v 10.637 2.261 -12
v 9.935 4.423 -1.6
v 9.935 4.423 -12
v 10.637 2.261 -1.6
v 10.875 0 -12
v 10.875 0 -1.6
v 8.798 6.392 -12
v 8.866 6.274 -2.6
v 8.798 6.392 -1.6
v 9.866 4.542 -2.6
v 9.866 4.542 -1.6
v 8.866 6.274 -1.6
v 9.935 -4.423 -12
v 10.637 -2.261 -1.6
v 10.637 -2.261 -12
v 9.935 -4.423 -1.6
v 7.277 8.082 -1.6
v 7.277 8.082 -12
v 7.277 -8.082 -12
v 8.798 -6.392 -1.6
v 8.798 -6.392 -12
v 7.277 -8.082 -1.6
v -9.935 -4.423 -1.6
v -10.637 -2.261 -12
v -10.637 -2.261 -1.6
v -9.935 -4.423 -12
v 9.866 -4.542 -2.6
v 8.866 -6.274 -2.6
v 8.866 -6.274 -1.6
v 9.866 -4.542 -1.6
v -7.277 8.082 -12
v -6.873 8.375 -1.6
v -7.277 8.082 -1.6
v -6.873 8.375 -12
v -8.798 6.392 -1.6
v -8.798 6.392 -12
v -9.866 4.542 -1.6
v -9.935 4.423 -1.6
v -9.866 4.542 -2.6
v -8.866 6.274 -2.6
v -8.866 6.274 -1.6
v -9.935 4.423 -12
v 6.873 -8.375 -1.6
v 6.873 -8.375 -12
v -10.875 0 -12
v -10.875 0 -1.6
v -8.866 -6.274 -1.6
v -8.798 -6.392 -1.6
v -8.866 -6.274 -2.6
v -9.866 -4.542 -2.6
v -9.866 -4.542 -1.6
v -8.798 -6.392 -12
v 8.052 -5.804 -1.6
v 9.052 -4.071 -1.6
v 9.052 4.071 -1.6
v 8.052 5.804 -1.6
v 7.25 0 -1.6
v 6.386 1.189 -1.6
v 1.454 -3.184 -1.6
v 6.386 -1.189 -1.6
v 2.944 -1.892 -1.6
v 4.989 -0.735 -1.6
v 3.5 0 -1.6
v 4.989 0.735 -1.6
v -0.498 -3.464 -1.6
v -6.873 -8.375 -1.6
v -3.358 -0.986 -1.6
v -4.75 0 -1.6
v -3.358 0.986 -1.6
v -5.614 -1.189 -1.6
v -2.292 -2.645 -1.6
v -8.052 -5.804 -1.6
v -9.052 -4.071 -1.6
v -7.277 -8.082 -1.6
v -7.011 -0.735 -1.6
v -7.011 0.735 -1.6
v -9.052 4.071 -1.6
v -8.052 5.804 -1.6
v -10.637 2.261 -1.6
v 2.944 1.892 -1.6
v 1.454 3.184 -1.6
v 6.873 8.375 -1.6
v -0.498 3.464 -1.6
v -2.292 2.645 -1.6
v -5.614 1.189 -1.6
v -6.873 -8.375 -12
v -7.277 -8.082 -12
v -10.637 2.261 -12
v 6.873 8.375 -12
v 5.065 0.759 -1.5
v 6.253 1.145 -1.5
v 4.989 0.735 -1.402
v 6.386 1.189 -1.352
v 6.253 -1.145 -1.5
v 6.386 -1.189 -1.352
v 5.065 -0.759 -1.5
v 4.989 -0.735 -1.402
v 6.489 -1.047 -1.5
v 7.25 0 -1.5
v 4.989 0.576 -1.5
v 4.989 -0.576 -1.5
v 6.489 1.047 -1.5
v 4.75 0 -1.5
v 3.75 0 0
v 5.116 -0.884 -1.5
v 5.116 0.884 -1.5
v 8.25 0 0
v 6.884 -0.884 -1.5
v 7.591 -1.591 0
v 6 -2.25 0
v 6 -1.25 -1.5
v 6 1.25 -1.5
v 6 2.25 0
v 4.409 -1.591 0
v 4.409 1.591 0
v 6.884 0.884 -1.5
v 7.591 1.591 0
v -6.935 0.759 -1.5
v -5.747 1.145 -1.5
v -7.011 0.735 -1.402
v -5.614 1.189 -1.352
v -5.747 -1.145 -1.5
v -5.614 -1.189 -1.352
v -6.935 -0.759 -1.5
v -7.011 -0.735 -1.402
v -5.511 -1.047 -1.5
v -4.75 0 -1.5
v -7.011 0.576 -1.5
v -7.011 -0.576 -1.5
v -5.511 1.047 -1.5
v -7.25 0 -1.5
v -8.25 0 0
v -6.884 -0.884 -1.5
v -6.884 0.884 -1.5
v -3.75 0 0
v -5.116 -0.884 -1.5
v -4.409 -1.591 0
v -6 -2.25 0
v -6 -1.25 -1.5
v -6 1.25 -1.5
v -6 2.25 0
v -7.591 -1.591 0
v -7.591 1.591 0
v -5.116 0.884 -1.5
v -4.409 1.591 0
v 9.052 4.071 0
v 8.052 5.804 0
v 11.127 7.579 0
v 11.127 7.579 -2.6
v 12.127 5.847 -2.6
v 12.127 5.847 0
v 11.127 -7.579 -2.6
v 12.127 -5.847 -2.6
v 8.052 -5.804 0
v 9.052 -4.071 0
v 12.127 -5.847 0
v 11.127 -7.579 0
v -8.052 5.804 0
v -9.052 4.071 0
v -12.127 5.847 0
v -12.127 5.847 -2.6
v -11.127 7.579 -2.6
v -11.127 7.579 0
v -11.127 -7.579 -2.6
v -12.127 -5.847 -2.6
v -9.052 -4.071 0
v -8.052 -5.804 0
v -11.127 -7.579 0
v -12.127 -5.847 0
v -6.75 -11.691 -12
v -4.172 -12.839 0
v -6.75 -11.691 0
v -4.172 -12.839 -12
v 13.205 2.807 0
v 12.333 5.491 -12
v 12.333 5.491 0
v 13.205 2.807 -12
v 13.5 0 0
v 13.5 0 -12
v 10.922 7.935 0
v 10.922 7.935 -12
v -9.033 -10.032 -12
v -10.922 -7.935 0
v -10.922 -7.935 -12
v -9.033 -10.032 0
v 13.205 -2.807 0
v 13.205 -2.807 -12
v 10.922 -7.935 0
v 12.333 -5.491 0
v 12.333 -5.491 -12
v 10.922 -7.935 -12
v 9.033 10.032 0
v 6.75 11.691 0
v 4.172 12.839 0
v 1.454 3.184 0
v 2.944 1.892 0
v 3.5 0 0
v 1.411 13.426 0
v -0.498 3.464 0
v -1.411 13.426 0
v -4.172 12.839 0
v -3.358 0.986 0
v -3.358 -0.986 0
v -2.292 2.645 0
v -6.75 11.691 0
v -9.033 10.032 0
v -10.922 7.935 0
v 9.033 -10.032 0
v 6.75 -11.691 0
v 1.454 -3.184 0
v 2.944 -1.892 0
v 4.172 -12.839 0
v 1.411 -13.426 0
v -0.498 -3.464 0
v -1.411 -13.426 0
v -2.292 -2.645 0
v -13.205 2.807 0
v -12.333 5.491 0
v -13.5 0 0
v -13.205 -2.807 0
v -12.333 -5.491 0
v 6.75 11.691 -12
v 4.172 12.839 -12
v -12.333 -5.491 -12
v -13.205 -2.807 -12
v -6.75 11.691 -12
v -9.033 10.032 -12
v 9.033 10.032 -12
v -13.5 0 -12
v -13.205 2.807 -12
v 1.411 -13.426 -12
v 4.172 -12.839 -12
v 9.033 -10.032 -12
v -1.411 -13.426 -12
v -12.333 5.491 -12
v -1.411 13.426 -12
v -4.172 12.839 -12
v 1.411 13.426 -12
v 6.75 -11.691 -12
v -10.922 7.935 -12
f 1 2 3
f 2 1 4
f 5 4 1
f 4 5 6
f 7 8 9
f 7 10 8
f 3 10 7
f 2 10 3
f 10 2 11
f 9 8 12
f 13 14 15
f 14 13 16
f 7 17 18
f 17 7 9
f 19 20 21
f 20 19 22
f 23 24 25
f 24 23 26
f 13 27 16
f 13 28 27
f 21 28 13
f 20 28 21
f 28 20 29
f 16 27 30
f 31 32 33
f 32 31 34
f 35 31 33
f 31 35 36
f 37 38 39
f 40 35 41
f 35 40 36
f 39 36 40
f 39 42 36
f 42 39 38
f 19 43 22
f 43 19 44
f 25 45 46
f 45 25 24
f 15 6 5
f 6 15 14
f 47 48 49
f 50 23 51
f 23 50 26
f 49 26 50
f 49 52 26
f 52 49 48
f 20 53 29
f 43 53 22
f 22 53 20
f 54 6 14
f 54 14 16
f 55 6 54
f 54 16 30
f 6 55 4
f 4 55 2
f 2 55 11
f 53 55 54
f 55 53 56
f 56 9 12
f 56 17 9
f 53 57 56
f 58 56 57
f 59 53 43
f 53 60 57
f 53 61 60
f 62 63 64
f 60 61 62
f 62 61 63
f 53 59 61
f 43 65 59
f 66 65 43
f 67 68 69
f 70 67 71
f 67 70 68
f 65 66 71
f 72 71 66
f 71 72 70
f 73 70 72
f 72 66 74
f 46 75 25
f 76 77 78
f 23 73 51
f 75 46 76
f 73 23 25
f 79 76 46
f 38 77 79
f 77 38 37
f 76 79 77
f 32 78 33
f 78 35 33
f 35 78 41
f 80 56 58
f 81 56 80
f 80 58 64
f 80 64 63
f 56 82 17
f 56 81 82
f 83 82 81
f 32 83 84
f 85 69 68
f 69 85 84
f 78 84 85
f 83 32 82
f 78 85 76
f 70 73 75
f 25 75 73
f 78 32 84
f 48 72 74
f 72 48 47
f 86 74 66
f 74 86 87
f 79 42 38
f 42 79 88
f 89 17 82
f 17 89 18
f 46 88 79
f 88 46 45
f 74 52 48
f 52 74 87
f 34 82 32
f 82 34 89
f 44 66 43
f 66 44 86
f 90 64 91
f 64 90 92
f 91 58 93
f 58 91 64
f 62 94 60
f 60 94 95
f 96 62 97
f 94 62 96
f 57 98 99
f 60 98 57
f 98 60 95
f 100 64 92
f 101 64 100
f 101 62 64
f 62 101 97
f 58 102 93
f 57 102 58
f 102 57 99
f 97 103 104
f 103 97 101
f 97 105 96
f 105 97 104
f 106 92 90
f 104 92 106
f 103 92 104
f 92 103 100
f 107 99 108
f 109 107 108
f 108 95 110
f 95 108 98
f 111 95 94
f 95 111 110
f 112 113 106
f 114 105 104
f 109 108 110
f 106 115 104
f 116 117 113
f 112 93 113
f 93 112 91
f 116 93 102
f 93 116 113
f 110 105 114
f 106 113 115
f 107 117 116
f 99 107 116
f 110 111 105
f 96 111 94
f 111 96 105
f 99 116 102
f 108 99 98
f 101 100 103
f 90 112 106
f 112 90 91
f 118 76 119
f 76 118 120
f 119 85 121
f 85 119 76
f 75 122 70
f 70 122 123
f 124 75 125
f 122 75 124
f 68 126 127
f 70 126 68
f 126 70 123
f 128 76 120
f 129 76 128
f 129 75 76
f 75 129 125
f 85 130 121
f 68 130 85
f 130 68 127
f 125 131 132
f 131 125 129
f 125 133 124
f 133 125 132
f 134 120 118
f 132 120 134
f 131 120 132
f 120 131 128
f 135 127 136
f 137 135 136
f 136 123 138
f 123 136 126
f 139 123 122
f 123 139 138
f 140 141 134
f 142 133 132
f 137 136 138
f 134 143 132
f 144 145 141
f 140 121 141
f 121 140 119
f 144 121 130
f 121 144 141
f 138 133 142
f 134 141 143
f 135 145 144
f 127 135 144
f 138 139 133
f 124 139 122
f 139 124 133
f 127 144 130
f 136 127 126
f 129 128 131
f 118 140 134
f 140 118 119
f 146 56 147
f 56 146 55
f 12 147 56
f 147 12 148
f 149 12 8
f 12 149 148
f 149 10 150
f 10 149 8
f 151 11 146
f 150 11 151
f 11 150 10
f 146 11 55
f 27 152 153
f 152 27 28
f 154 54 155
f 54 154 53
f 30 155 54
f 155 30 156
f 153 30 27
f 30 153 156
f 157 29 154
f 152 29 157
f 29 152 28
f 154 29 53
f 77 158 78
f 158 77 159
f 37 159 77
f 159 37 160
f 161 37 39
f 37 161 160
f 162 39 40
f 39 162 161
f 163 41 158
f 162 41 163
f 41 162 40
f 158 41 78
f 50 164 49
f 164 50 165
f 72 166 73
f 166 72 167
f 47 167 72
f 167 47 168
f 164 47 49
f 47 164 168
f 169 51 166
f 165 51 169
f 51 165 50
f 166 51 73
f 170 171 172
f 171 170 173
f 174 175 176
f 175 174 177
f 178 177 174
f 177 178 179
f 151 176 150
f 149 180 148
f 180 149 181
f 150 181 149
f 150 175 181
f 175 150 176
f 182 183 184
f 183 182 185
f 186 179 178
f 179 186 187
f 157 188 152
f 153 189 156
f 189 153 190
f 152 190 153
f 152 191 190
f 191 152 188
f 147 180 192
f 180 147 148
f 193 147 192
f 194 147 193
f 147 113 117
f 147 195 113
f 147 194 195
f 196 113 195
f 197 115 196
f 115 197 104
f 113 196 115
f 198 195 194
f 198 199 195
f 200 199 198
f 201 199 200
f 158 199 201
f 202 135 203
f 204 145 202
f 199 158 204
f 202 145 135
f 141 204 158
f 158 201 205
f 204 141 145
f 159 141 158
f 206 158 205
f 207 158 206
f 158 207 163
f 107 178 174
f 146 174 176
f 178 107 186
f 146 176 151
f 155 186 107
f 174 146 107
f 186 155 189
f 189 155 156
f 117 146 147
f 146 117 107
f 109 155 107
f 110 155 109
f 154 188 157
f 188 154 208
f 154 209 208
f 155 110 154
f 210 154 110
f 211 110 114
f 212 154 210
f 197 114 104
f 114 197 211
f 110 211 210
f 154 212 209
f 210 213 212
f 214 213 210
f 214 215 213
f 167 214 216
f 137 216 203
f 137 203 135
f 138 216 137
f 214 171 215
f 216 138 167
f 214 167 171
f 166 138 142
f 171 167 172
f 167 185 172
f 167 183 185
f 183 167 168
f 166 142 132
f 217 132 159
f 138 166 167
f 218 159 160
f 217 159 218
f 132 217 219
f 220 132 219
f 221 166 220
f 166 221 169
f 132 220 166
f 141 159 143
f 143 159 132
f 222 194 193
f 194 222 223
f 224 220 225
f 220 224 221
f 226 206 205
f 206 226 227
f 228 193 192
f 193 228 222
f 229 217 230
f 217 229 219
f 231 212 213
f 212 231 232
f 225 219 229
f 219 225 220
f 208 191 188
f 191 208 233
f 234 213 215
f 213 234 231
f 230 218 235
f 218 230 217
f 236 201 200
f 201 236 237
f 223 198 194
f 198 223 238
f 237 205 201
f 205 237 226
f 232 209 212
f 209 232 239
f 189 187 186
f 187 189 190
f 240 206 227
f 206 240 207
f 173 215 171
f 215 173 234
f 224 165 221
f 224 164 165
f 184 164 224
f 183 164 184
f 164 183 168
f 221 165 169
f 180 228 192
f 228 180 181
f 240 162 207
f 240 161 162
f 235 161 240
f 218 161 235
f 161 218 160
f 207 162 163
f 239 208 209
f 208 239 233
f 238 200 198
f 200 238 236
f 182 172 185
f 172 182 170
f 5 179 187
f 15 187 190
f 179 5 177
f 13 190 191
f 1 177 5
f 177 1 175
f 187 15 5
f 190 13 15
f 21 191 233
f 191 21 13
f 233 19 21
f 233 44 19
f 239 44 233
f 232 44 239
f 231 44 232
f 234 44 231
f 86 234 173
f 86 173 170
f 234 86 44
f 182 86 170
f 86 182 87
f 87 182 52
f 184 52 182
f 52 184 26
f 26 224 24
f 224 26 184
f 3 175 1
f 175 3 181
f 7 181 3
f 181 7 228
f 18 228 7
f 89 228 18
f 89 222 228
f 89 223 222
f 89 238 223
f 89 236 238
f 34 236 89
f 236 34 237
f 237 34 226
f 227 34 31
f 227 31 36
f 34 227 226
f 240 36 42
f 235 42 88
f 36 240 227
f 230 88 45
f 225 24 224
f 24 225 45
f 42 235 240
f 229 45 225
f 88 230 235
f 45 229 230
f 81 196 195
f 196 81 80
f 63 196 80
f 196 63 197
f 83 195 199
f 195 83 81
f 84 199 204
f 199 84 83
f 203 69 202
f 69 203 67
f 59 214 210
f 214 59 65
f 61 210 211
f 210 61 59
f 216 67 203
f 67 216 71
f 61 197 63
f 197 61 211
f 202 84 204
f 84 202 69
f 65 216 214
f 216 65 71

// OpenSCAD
//$fa=0.01;
//$fs=0.2;

// flat_head_screw_hole - Approximate shape of a flat head screw
// The head is centered at the origin and the screw points up.
//
// screw_d = shaft diameter
// screw_h = overall length of screw
// head_d = screw head diameter
// head_h = thickness of screw head
// head_extra = extra thickness on top of the screw head
//     (This extra thickness is not part of the screw.)
//
// Example:
//   flat_head_screw_hole(2.5, 10, 4.5, 1.5, 1);
module flat_head_screw_hole(screw_d, screw_h, head_d, head_h, head_extra = 0)
{
    cylinder(d = screw_d, h = screw_h);
    cylinder(d1 = head_d, d2 = screw_d, h = head_h);
    translate([0, 0, -head_extra]) cylinder(d = head_d, h = head_extra);
}

// flattened_cylinder - Cylinder with flattened sides
// Example:
//   flattened_cylinder(20, 15, 12);
module flattened_cylinder(d, w, h)
{
    intersection()
    {
        cylinder(d = d, h = h);
        
        translate([0, 0, h * 0.5])
            cube([d + 1, w, h + 2], center = true);
    }
}

// motor_holder - Holder for a 180 size motor.
// part="all" creates the entire motor holder
// part="inside" creates the inner hole where the motor goes
// Example:
motor_holder(27, 12);
%color("red", 0.5) motor_holder(27, 12, part = "inside");

module motor_holder(holder_od, holder_h, part="all")
{
    // size of a 180 motor
    motor_d = 20;
    motor_w = 15;

    // margin to allow the motor to fit in the holder
    motor_d_margin = 1.75;

    // size of the motor collar
    // This is the part at the front of the motor, where the shaft comes out.
    collar_d = 6;
    collar_h = 1.6;

    // margin to allow the collar to fit in the holder
    collar_d_margin = 1;

    // location of the motor mounting screws
    screw_offsets = [[6, 0, 0], [-6, 0, 0]];

    // size of the screw holes to mount the motor (including margin)
    screw_hole_d = 2.5;
    head_d = 4.5;
    head_h = 1.5;

    // access notches to help remove support material after 3D printing
    notch_x = (holder_od - (motor_d + motor_d_margin)) * 0.5 + 1; // length
    notch_y = 2; // width
    notch_z = collar_h + 1; // depth
    notch_offset_x = holder_od * 0.5 - notch_x * 0.5;
    notch_offset_z = notch_z * 0.5 - collar_h;
    notch_r_z = [30, -30, 150, -150];

    if (part == "inside")
    {
        // hole for the motor body
        translate([0, 0, -holder_h])
            flattened_cylinder(motor_d + motor_d_margin,
                               motor_w + motor_d_margin,
                               holder_h - collar_h);
    }
    else difference()
    {
        // outer cylinder for the motor holder
        translate([0, 0, -holder_h * 0.5])
            cylinder(d = holder_od, h = holder_h, center = true);
        
        // hole for the motor body
        translate([0, 0, -holder_h - collar_h])
            flattened_cylinder(motor_d + motor_d_margin,
                               motor_w + motor_d_margin,
                               holder_h);
        
        // hole for the motor collar
        translate([0, 0, -collar_h - 1])
            cylinder(d = collar_d + collar_d_margin, h = collar_h + 2);

        // holes for the mounting screws
        for(xyz = screw_offsets) translate(xyz)
        {
            rotate(180, [1,0,0])
                flat_head_screw_hole(screw_hole_d, collar_h + 1,
                                     head_d, head_h, 1);
        }

        // holes for access notches
        for(r_z = notch_r_z)
        {
            rotate(r_z, [0, 0, 1])
            translate([notch_offset_x + 1, 0,
                       1 - notch_offset_z - collar_h])
                cube([notch_x + 2, notch_y, notch_z + 2],
                    center=true);    
        }
    }
}
